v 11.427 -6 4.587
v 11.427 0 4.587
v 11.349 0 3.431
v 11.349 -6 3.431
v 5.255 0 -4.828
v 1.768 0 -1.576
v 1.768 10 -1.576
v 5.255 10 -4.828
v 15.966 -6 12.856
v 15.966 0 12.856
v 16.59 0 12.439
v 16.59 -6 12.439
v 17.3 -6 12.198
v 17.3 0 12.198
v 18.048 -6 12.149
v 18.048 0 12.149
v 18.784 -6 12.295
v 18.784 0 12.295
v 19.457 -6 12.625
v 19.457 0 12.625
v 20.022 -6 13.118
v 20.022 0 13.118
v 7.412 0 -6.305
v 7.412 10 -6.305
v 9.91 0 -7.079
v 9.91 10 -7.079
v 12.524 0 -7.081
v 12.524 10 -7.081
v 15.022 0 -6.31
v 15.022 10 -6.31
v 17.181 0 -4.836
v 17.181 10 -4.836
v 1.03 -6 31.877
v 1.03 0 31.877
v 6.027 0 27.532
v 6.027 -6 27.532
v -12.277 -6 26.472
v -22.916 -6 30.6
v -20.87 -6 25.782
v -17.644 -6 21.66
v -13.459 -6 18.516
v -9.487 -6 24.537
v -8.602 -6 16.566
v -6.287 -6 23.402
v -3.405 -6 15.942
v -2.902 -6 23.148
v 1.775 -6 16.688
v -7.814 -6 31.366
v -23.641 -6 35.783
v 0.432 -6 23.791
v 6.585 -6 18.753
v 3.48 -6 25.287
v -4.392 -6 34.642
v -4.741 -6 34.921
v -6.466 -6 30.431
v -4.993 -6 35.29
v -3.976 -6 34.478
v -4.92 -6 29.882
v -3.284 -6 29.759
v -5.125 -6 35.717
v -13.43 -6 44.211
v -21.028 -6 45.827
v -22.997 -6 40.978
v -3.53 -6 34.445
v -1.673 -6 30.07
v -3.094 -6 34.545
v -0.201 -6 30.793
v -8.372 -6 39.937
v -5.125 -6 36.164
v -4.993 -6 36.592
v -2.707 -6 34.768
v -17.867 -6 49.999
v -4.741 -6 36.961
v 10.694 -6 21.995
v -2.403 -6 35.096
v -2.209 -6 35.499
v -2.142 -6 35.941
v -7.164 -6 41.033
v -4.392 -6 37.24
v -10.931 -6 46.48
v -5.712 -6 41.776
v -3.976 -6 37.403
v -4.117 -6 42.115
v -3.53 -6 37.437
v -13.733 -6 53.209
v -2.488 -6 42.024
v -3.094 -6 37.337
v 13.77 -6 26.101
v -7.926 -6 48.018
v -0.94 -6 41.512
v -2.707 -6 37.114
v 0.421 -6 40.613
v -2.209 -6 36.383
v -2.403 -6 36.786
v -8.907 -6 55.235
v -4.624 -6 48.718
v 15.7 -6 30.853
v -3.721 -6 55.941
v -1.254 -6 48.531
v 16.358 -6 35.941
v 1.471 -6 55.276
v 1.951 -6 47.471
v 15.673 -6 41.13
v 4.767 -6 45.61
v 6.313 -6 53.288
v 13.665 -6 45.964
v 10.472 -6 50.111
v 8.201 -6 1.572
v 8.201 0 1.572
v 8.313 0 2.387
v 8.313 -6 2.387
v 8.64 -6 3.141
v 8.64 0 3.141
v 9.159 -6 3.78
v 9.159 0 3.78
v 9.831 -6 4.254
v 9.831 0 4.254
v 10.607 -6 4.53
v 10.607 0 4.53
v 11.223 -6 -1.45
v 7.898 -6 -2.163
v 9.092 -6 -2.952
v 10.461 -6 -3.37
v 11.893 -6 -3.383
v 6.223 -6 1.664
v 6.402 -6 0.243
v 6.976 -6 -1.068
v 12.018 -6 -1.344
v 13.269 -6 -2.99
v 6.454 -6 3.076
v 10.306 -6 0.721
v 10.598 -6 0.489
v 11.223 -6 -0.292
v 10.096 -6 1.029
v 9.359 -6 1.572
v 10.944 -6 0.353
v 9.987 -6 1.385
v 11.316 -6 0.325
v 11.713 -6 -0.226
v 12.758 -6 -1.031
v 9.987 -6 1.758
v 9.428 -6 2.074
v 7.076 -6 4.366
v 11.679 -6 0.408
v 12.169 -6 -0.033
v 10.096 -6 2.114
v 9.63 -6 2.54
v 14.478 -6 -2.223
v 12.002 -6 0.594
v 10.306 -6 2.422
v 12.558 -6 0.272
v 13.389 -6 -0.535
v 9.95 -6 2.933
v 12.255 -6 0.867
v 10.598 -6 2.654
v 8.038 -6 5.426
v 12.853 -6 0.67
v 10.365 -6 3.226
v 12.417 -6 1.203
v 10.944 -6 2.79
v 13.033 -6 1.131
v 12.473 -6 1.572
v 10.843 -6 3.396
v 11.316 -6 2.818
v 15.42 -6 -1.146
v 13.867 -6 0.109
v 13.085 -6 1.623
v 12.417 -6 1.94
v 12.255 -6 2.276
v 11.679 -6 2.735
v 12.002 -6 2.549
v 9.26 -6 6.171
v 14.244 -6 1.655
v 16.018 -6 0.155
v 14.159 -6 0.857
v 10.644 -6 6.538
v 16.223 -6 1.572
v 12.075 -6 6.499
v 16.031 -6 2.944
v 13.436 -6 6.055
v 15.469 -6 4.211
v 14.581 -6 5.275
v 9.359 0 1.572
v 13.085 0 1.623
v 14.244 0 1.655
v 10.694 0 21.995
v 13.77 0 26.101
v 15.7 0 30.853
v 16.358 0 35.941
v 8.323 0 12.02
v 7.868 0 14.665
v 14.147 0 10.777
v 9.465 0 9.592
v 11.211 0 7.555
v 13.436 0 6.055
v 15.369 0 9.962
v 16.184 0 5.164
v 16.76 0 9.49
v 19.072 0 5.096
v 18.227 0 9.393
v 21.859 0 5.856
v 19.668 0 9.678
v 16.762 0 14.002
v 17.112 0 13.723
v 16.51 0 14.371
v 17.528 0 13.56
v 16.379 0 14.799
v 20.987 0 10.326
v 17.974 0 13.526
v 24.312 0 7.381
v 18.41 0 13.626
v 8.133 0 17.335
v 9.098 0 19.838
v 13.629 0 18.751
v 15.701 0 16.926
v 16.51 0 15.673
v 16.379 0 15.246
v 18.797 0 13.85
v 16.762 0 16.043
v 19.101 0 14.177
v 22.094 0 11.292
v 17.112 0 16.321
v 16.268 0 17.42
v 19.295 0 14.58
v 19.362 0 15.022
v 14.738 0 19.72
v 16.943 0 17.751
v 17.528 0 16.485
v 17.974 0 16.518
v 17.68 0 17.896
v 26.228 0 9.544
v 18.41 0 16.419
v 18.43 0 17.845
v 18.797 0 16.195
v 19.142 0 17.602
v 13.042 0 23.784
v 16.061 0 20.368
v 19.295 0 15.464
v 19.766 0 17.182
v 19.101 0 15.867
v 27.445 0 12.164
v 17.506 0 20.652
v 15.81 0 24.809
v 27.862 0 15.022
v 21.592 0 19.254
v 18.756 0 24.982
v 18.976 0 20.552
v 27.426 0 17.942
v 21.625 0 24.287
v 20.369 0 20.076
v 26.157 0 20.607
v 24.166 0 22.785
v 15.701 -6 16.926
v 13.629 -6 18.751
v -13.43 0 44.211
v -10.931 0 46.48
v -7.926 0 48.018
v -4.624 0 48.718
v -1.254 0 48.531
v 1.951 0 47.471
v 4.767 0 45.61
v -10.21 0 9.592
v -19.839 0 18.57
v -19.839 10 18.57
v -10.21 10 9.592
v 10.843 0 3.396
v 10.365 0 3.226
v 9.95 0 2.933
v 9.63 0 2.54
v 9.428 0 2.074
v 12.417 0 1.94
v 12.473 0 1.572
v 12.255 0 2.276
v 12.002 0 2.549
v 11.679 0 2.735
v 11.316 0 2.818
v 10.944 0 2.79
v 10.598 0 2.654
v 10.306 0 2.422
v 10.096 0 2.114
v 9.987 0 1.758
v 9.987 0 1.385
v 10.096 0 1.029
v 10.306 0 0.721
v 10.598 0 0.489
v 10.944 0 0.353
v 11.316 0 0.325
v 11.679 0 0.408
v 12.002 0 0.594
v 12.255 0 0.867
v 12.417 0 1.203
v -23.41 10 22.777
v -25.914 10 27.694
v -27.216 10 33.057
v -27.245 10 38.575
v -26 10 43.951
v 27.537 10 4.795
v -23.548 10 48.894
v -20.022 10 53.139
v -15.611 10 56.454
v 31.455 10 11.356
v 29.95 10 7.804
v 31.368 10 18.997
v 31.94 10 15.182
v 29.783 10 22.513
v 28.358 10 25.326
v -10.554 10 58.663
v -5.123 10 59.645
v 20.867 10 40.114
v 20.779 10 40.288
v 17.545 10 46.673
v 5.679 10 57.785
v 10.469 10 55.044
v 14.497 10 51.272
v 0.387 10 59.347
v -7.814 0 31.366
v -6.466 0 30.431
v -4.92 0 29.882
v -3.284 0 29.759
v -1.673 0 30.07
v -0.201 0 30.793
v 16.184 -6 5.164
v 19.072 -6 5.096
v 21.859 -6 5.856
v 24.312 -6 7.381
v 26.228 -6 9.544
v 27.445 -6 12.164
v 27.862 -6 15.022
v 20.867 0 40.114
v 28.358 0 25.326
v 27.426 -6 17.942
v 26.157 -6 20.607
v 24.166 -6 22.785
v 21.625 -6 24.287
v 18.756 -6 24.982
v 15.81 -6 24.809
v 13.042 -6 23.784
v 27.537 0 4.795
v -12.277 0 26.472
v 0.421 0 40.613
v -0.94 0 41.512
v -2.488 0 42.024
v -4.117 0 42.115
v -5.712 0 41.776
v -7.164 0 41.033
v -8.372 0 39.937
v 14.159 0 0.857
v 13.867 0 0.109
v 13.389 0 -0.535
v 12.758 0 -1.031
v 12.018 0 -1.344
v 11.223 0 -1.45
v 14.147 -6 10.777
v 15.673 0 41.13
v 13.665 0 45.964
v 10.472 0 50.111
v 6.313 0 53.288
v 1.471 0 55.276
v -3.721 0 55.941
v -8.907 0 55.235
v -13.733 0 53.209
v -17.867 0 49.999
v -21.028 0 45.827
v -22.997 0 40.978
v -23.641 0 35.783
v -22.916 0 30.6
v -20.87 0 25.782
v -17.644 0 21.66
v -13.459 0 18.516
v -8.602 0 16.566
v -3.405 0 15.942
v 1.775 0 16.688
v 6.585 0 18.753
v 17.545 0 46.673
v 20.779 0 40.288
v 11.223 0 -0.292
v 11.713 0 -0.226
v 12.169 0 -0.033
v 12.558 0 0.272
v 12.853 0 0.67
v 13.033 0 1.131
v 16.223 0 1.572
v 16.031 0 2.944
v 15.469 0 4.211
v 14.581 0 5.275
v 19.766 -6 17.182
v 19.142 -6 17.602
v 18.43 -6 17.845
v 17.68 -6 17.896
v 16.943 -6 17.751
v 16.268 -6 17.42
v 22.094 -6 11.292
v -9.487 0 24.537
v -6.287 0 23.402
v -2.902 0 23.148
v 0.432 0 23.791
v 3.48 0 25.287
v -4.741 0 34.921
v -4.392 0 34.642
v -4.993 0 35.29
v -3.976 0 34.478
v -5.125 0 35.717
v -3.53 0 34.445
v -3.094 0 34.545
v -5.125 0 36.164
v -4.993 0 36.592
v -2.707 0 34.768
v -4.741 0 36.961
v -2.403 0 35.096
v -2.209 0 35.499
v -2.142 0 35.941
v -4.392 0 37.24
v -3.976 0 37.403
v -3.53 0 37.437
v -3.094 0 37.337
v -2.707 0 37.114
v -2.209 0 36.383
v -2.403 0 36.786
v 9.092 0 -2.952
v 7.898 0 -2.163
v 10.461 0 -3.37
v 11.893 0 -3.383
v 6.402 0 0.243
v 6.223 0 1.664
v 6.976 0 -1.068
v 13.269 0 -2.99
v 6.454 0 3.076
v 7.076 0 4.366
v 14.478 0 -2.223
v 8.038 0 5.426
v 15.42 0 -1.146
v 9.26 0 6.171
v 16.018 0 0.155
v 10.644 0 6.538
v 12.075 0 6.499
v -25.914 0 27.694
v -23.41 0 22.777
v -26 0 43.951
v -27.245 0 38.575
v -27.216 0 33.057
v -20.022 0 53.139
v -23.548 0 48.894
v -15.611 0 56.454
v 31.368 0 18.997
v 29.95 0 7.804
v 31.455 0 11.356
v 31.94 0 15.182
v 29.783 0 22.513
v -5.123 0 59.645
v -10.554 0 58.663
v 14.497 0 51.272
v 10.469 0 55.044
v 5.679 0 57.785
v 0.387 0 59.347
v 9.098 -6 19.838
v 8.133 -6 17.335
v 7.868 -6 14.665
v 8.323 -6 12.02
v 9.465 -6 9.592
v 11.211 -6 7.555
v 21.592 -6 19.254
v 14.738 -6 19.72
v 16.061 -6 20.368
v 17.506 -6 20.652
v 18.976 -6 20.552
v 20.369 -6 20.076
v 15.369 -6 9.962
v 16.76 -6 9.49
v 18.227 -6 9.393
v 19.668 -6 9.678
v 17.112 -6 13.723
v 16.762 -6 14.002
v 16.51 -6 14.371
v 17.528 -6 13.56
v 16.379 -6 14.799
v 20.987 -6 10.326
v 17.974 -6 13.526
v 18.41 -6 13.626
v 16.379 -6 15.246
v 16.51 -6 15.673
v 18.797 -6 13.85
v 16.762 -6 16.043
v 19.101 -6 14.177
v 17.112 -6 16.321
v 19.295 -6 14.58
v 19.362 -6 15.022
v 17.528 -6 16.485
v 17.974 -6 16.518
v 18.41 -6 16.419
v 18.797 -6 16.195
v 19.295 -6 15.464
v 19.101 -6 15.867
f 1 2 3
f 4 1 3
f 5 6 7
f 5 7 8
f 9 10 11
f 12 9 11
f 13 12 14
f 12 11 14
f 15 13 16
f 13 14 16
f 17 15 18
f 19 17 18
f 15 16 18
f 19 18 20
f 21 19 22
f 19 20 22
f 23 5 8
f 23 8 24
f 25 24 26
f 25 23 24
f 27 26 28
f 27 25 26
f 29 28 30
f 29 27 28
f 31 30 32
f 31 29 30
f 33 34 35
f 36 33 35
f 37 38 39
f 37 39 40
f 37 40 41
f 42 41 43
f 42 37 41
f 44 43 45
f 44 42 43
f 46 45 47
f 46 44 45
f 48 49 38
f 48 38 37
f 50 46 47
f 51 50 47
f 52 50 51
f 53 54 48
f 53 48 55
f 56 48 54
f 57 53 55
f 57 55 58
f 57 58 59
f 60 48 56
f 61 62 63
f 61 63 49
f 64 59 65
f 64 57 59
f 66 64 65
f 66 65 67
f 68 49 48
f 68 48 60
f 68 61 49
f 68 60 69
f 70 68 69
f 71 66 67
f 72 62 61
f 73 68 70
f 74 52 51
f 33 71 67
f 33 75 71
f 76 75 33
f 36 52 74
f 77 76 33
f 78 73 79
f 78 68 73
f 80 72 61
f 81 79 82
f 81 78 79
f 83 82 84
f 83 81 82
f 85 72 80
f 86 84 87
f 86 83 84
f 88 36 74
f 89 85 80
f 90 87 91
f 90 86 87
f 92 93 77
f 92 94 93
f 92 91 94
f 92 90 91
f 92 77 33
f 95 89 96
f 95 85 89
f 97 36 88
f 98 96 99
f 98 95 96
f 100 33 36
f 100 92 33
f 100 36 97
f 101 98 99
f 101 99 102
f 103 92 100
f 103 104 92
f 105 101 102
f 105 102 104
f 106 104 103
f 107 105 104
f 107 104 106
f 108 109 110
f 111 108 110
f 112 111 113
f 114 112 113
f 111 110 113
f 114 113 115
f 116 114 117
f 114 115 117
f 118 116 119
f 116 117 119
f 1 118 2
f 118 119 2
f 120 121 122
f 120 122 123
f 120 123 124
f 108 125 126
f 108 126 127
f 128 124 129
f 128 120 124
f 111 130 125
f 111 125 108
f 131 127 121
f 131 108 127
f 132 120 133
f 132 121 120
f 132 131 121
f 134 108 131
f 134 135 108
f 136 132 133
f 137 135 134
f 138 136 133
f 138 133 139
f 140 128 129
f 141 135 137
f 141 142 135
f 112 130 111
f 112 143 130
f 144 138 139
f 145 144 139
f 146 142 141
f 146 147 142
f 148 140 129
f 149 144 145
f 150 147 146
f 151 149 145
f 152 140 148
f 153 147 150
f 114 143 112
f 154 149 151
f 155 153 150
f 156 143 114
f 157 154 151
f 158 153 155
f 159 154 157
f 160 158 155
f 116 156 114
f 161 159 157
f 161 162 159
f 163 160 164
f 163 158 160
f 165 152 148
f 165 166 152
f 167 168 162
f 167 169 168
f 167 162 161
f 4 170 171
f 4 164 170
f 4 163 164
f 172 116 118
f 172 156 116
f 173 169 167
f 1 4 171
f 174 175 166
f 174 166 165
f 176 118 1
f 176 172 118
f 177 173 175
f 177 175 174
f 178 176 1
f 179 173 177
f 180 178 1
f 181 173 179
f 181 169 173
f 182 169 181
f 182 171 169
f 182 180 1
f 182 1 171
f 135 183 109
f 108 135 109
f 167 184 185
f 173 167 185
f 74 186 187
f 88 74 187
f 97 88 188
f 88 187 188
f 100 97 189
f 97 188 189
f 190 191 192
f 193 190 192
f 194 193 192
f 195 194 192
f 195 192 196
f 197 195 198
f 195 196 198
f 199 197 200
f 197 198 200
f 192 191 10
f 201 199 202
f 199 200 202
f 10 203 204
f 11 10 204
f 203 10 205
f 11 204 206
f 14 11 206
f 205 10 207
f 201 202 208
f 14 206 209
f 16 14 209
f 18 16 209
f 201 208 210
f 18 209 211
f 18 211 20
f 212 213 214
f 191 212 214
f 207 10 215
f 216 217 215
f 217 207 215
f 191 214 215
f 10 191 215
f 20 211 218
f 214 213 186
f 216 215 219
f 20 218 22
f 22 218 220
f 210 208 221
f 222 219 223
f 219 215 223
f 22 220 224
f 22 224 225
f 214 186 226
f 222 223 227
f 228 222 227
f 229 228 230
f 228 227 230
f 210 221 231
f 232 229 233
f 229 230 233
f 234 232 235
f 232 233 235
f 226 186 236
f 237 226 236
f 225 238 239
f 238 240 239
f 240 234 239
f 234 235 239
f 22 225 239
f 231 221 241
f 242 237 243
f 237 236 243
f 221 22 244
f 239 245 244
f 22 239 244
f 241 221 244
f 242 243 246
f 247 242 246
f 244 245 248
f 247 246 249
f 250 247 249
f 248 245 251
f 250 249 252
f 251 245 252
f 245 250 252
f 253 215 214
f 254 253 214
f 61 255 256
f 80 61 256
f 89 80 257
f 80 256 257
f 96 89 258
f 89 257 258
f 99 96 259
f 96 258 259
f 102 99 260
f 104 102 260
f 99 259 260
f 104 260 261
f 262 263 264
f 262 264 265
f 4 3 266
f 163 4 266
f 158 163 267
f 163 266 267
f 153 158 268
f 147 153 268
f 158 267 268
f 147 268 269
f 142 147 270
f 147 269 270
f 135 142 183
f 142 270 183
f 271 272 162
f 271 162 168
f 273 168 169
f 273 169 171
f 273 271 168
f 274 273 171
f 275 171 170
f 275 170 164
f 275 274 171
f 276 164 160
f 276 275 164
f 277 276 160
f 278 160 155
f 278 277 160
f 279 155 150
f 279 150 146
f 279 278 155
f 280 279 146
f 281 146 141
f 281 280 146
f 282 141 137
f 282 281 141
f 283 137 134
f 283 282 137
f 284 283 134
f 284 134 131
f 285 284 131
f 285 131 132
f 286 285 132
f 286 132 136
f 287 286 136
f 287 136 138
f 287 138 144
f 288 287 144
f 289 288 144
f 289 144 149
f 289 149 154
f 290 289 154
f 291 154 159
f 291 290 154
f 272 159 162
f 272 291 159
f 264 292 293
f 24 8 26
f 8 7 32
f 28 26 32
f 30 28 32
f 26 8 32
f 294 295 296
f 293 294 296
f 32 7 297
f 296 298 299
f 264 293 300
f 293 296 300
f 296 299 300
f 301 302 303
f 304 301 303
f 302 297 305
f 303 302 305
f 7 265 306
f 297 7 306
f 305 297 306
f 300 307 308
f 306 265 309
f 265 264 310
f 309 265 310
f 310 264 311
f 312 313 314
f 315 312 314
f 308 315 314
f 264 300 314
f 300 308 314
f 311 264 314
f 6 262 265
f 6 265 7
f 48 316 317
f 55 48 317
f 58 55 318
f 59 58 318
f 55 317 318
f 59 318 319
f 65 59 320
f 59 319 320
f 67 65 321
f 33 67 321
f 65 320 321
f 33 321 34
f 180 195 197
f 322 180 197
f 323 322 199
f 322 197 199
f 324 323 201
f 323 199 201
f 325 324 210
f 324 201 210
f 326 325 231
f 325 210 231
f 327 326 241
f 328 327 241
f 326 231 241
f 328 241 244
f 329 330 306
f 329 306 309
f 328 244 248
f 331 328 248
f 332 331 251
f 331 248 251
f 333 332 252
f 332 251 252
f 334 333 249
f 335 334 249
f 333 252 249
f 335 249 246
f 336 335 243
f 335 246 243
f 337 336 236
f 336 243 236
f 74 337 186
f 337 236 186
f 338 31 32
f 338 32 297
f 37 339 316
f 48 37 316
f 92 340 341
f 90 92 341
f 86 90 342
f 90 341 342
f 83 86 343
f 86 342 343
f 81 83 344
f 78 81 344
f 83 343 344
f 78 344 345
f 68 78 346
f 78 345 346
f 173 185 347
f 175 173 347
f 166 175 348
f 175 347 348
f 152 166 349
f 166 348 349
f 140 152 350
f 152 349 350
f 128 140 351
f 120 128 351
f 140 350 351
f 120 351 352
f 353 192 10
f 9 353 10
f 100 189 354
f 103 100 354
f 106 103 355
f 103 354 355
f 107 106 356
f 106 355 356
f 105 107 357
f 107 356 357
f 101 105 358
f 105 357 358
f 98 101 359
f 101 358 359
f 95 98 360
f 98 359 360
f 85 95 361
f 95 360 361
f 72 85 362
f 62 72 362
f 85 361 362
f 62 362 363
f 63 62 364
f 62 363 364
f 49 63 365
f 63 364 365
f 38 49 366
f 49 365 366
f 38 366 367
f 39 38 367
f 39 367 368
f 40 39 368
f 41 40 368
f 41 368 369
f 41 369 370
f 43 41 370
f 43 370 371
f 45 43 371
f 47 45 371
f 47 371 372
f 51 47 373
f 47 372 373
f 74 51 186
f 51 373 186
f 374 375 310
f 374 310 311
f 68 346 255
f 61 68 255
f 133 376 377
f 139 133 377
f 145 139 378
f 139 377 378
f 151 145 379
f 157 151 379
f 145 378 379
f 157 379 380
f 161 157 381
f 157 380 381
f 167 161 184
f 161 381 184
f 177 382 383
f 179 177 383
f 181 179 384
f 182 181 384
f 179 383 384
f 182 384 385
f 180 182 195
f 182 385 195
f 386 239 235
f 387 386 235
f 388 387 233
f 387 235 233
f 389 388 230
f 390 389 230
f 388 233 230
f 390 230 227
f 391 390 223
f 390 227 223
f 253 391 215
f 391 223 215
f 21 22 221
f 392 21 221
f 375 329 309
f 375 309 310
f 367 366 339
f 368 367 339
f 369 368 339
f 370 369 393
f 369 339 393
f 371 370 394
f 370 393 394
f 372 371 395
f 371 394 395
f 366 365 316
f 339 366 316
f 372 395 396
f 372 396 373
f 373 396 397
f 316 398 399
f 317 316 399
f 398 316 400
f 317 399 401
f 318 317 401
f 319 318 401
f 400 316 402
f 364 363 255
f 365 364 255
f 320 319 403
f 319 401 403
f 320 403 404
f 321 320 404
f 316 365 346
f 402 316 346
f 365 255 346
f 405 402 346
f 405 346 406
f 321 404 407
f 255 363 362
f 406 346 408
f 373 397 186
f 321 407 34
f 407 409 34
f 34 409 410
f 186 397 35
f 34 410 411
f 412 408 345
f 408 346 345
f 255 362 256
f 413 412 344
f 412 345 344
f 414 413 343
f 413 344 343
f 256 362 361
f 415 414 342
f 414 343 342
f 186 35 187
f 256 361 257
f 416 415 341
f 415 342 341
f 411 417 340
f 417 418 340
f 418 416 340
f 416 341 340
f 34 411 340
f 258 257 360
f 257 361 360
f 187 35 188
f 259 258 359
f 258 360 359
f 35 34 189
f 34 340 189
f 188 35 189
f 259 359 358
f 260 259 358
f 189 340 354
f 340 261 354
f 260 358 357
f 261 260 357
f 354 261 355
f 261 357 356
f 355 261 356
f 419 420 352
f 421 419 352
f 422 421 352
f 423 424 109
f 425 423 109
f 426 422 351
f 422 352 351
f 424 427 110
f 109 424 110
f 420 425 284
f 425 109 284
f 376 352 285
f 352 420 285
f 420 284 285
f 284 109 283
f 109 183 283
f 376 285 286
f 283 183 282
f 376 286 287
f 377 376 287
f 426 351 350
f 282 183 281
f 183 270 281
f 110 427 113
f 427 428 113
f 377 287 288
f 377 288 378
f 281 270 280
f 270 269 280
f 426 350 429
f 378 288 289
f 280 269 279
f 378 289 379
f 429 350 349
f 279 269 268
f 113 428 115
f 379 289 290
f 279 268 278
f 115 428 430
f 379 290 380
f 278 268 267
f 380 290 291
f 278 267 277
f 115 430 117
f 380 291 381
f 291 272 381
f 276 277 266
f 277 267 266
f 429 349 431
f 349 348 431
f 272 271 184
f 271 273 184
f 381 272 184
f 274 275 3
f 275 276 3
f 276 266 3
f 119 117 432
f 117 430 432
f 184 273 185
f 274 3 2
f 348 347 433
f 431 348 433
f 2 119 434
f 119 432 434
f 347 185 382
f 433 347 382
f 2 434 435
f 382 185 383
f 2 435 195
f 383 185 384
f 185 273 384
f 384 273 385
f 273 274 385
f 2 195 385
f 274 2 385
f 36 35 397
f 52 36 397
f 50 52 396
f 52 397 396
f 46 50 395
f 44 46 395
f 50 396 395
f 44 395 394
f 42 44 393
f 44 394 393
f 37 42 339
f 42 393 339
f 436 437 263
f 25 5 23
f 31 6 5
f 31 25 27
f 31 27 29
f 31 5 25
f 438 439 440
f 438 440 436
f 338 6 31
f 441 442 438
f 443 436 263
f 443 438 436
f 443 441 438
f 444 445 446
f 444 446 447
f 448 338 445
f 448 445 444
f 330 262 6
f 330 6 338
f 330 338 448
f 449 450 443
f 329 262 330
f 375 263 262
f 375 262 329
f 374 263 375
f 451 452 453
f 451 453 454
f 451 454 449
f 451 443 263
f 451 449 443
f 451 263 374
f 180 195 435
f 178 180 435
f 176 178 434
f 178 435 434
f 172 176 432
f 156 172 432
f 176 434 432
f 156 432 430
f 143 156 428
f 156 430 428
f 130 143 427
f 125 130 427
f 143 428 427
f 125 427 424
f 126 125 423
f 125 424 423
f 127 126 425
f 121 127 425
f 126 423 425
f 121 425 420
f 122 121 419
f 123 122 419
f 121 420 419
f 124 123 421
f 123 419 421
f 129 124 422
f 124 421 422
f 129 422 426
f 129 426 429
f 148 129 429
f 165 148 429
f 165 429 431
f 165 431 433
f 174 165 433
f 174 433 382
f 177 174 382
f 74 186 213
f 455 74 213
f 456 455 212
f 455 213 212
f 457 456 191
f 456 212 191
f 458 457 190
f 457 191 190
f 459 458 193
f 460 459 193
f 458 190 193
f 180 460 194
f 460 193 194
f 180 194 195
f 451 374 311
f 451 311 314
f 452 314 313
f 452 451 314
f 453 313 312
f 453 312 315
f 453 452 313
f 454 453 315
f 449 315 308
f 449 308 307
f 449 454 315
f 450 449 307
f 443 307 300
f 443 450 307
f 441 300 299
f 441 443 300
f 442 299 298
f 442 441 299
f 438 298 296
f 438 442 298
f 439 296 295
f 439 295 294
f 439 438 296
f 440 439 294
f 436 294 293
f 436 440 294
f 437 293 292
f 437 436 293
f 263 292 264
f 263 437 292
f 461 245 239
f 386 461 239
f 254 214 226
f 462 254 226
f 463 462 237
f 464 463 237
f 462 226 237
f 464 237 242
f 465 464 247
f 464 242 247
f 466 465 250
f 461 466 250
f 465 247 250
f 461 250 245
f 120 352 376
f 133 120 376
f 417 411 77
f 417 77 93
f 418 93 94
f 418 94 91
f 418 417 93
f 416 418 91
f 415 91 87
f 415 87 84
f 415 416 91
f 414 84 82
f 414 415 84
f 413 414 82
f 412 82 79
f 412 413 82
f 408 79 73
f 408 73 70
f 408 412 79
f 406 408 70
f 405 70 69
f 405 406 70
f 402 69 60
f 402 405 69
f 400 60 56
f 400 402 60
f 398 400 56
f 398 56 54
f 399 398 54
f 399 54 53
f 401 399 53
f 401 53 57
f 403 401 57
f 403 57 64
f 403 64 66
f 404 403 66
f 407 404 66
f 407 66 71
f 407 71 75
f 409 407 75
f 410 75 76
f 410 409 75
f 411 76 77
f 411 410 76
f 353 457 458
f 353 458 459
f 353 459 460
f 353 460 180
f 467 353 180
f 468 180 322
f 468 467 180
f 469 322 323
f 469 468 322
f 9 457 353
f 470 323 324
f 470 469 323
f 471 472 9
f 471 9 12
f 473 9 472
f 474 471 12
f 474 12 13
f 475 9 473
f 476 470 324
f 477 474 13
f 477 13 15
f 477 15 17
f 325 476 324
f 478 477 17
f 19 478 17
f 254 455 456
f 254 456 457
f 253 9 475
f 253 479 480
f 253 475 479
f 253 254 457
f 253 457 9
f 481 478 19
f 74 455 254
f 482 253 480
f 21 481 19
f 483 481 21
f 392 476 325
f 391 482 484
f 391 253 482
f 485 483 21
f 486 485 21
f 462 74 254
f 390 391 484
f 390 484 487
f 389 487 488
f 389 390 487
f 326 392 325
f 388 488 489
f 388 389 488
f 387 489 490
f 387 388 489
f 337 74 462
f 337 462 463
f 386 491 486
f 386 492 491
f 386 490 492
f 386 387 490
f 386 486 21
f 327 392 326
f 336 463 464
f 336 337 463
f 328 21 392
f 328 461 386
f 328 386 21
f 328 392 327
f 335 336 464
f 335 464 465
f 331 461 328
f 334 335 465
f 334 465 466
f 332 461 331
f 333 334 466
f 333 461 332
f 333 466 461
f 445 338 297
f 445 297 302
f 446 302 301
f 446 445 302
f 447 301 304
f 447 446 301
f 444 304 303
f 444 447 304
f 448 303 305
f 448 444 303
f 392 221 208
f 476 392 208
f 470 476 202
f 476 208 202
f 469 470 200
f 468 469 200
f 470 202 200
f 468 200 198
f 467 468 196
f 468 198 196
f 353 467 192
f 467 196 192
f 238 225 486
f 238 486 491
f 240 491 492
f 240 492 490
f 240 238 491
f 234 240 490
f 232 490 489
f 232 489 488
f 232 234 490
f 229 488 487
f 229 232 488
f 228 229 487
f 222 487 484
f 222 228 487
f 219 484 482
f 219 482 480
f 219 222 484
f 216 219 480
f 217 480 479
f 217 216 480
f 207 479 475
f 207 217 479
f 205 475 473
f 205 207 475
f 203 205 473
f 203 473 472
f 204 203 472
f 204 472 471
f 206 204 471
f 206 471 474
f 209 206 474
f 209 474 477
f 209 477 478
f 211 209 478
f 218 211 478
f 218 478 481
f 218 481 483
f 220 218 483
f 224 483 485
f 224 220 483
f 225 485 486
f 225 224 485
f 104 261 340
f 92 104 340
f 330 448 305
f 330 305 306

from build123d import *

# Parameters (mm, degrees)
F0_R     = 1.5
F1_DEPTH = 6
F0_R_2   = 1.25
F2_DEPTH = 10


with BuildPart() as f1:
    # F0 (on Front) → F1 (new body)
    with BuildSketch(Plane.XZ):
        with BuildLine():
            ThreePointArc((16.3580985837, 35.9408579887), (-22.1718407809, 43.466902577), (10.6939638692, 21.9951430011))
            ThreePointArc((10.6939638692, 21.9951430011), (14.8880379483, 28.4148134004), (16.3580985837, 35.9408579887))
        make_face()
        with BuildLine():
            ThreePointArc((6.0273938907, 27.5315641069), (-2.9016900494, 23.1477511551), (-12.2767915919, 26.4724807793))
            Line((-12.2767915919, 26.4724807793), (-7.8142975918, 31.3657192142))
            ThreePointArc((-7.8142975918, 31.3657192142), (-3.2842298057, 29.7592032207), (1.0303213842, 31.8774703929))
            Line((1.0303213842, 31.8774703929), (6.0273938907, 27.5315641069))
        make_face(mode=Mode.SUBTRACT)
        with Locations((-3.6419014163, 35.9408579887)):
            Circle(F0_R, mode=Mode.SUBTRACT)
        with BuildLine():
            Line((-8.3717686573, 39.9369986937), (-13.4304934995, 44.2109825557))
            ThreePointArc((-13.4304934995, 44.2109825557), (-4.624263657, 48.7176517866), (4.7673924656, 45.6101532957))
            Line((4.7673924656, 45.6101532957), (0.4214861795, 40.6130807892))
            ThreePointArc((0.4214861795, 40.6130807892), (-4.1165808127, 42.1146302652), (-8.3717686573, 39.9369986937))
        make_face(mode=Mode.SUBTRACT)
    extrude(amount=F1_DEPTH)


with BuildPart() as f1b:
    # F0 (on Front) → F1, piece 2 (new body)
    with BuildSketch(Plane.XZ):
        with BuildLine():
            ThreePointArc((13.435691954, 6.055194912), (23.1410041166, 6.529287036), (27.8618964924, 15.0222854872))
            ThreePointArc((27.8618964924, 15.0222854872), (21.6249187996, 24.2872551642), (10.6939638692, 21.9951430011))
            ThreePointArc((10.6939638692, 21.9951430011), (8.0066192055, 13.3271425439), (13.435691954, 6.055194912))
        make_face()
        with BuildLine():
            ThreePointArc((22.093804723, 11.2920162674), (18.2266093558, 9.392814797), (14.1466855378, 10.7771514154))
            Line((14.1466855378, 10.7771514154), (15.9656262669, 12.8555387151))
            ThreePointArc((15.9656262669, 12.8555387151), (18.0480485447, 12.1489634106), (20.0218927007, 13.1183294155))
            Line((20.0218927007, 13.1183294155), (22.093804723, 11.2920162674))
        make_face(mode=Mode.SUBTRACT)
        with Locations((17.8618964924, 15.0222854872)):
            Circle(F0_R, mode=Mode.SUBTRACT)
        with BuildLine():
            Line((21.5921657123, 19.2541937178), (19.7658525641, 17.1822816954))
            ThreePointArc((19.7658525641, 17.1822816954), (17.6803835082, 17.8959043518), (15.7012838619, 16.9255420131))
            Line((15.7012838619, 16.9255420131), (13.6287805547, 18.7511841427))
            ThreePointArc((13.6287805547, 18.7511841427), (17.5062725849, 20.6523376505), (21.5921657123, 19.2541937178))
        make_face(mode=Mode.SUBTRACT)
    extrude(amount=F1_DEPTH)


with BuildPart() as f1c:
    # F0 (on Front) → F1, piece 3 (new body)
    with BuildSketch(Plane.XZ):
        with BuildLine():
            ThreePointArc((16.2225897462, 1.5716495941), (15.4690889537, 4.2112034353), (13.435691954, 6.055194912))
            ThreePointArc((13.435691954, 6.055194912), (6.9760905387, -1.0679042471), (16.2225897462, 1.5716495941))
        make_face()
        with BuildLine():
            ThreePointArc((14.243500535, 1.6553022013), (13.3888888582, -0.5354925249), (11.2225897462, -1.4504191928))
            Line((11.2225897462, -1.4504191928), (11.2225897462, -0.2917109707))
            ThreePointArc((11.2225897462, -0.2917109707), (12.5582960526, 0.2724185686), (13.0852363074, 1.6232284893))
            Line((13.0852363074, 1.6232284893), (14.243500535, 1.6553022013))
        make_face(mode=Mode.SUBTRACT)
        with Locations((11.2225897462, 1.5716495941)):
            Circle(F0_R_2, mode=Mode.SUBTRACT)
        with BuildLine():
            Line((11.4274693125, 4.5867655315), (11.3489152971, 3.4307231402))
            ThreePointArc((11.3489152971, 3.4307231402), (9.950441456, 2.9331749601), (9.3592291814, 1.5716495941))
            Line((9.3592291814, 1.5716495941), (8.2005209593, 1.5716495941))
            ThreePointArc((8.2005209593, 1.5716495941), (9.1593714337, 3.7798230356), (11.4274693125, 4.5867655315))
        make_face(mode=Mode.SUBTRACT)
    extrude(amount=F1_DEPTH)


with BuildPart() as f2:
    # F0 (on Front) → F2 (new body)
    with BuildSketch(Plane.XZ):
        with BuildLine():
            Line((20.7791233288, 40.2880805518), (17.5451188249, 46.6727111977))
            ThreePointArc((17.5451188249, 46.6727111977), (-17.9128327561, 54.9251414541), (-19.8385976064, 18.5704943619))
            Line((-19.8385976064, 18.5704943619), (-10.2095571952, 9.5920615846))
            Line((-10.2095571952, 9.5920615846), (-7.1513450091, 12.8718821787))
            Line((-7.1513450091, 12.8718821787), (3.2381131314, 12.8718821787))
            Line((3.2381131314, 12.8718821787), (3.2381131314, 0))
            Line((3.2381131314, 0), (1.7682181228, -1.5764085769))
            Line((1.7682181228, -1.5764085769), (5.2553858867, -4.8279580579))
            ThreePointArc((5.2553858867, -4.8279580579), (11.2167692255, -7.17834847), (17.1812742584, -4.8358911888))
            Line((17.1812742584, -4.8358911888), (27.5374240602, 4.7947973267))
            ThreePointArc((27.5374240602, 4.7947973267), (31.8291700474, 13.2523653679), (29.7826724027, 22.5131098402))
            Line((29.7826724027, 22.5131098402), (28.3577955273, 25.3261277423))
            Line((28.3577955273, 25.3261277423), (20.8670881614, 28.5439335322))
            Line((20.8670881614, 28.5439335322), (20.8670881614, 40.1144187757))
            Line((20.8670881614, 40.1144187757), (20.7791233288, 40.2880805518))
        make_face()
        with BuildLine():
            ThreePointArc((16.2225897462, 1.5716495941), (6.9760905387, -1.0679042471), (13.435691954, 6.055194912))
            ThreePointArc((13.435691954, 6.055194912), (15.4690889537, 4.2112034353), (16.2225897462, 1.5716495941))
        make_face(mode=Mode.SUBTRACT)
        with BuildLine():
            ThreePointArc((10.6939638692, 21.9951430011), (21.6249187996, 24.2872551642), (27.8618964924, 15.0222854872))
            ThreePointArc((27.8618964924, 15.0222854872), (23.1410041166, 6.529287036), (13.435691954, 6.055194912))
            ThreePointArc((13.435691954, 6.055194912), (8.0066192055, 13.3271425439), (10.6939638692, 21.9951430011))
        make_face(mode=Mode.SUBTRACT)
        with BuildLine():
            ThreePointArc((16.3580985837, 35.9408579887), (14.8880379483, 28.4148134004), (10.6939638692, 21.9951430011))
            ThreePointArc((10.6939638692, 21.9951430011), (-22.1718407809, 43.466902577), (16.3580985837, 35.9408579887))
        make_face(mode=Mode.SUBTRACT)
        with BuildLine():
            ThreePointArc((16.3580985837, 35.9408579887), (-22.1718407809, 43.466902577), (10.6939638692, 21.9951430011))
            ThreePointArc((10.6939638692, 21.9951430011), (14.8880379483, 28.4148134004), (16.3580985837, 35.9408579887))
        make_face()
        with BuildLine():
            ThreePointArc((6.0273938907, 27.5315641069), (-2.9016900494, 23.1477511551), (-12.2767915919, 26.4724807793))
            Line((-12.2767915919, 26.4724807793), (-7.8142975918, 31.3657192142))
            ThreePointArc((-7.8142975918, 31.3657192142), (-3.2842298057, 29.7592032207), (1.0303213842, 31.8774703929))
            Line((1.0303213842, 31.8774703929), (6.0273938907, 27.5315641069))
        make_face(mode=Mode.SUBTRACT)
        with Locations((-3.6419014163, 35.9408579887)):
            Circle(F0_R, mode=Mode.SUBTRACT)
        with BuildLine():
            Line((-8.3717686573, 39.9369986937), (-13.4304934995, 44.2109825557))
            ThreePointArc((-13.4304934995, 44.2109825557), (-4.624263657, 48.7176517866), (4.7673924656, 45.6101532957))
            Line((4.7673924656, 45.6101532957), (0.4214861795, 40.6130807892))
            ThreePointArc((0.4214861795, 40.6130807892), (-4.1165808127, 42.1146302652), (-8.3717686573, 39.9369986937))
        make_face(mode=Mode.SUBTRACT)
        with BuildLine():
            ThreePointArc((13.435691954, 6.055194912), (23.1410041166, 6.529287036), (27.8618964924, 15.0222854872))
            ThreePointArc((27.8618964924, 15.0222854872), (21.6249187996, 24.2872551642), (10.6939638692, 21.9951430011))
            ThreePointArc((10.6939638692, 21.9951430011), (8.0066192055, 13.3271425439), (13.435691954, 6.055194912))
        make_face()
        with BuildLine():
            ThreePointArc((22.093804723, 11.2920162674), (18.2266093558, 9.392814797), (14.1466855378, 10.7771514154))
            Line((14.1466855378, 10.7771514154), (15.9656262669, 12.8555387151))
            ThreePointArc((15.9656262669, 12.8555387151), (18.0480485447, 12.1489634106), (20.0218927007, 13.1183294155))
            Line((20.0218927007, 13.1183294155), (22.093804723, 11.2920162674))
        make_face(mode=Mode.SUBTRACT)
        with Locations((17.8618964924, 15.0222854872)):
            Circle(F0_R, mode=Mode.SUBTRACT)
        with BuildLine():
            Line((21.5921657123, 19.2541937178), (19.7658525641, 17.1822816954))
            ThreePointArc((19.7658525641, 17.1822816954), (17.6803835082, 17.8959043518), (15.7012838619, 16.9255420131))
            Line((15.7012838619, 16.9255420131), (13.6287805547, 18.7511841427))
            ThreePointArc((13.6287805547, 18.7511841427), (17.5062725849, 20.6523376505), (21.5921657123, 19.2541937178))
        make_face(mode=Mode.SUBTRACT)
        Polygon((-7.1513450091, 12.8718821787), (-10.2095571952, 9.5920615846), (1.7682181228, -1.5764085769), (3.2381131314, 0), (3.2381131314, 12.8718821787), align=None)
        with BuildLine():
            Line((-7.8142975918, 31.3657192142), (-12.2767915919, 26.4724807793))
            ThreePointArc((-12.2767915919, 26.4724807793), (-2.9016900494, 23.1477511551), (6.0273938907, 27.5315641069))
            Line((6.0273938907, 27.5315641069), (1.0303213842, 31.8774703929))
            ThreePointArc((1.0303213842, 31.8774703929), (-3.2842298057, 29.7592032207), (-7.8142975918, 31.3657192142))
        make_face()
        with BuildLine():
            ThreePointArc((4.7673924656, 45.6101532957), (-4.624263657, 48.7176517866), (-13.4304934995, 44.2109825557))
            Line((-13.4304934995, 44.2109825557), (-8.3717686573, 39.9369986937))
            ThreePointArc((-8.3717686573, 39.9369986937), (-4.1165808127, 42.1146302652), (0.4214861795, 40.6130807892))
            Line((0.4214861795, 40.6130807892), (4.7673924656, 45.6101532957))
        make_face()
        with BuildLine():
            ThreePointArc((16.2225897462, 1.5716495941), (15.4690889537, 4.2112034353), (13.435691954, 6.055194912))
            ThreePointArc((13.435691954, 6.055194912), (6.9760905387, -1.0679042471), (16.2225897462, 1.5716495941))
        make_face()
        with BuildLine():
            ThreePointArc((14.243500535, 1.6553022013), (13.3888888582, -0.5354925249), (11.2225897462, -1.4504191928))
            Line((11.2225897462, -1.4504191928), (11.2225897462, -0.2917109707))
            ThreePointArc((11.2225897462, -0.2917109707), (12.5582960526, 0.2724185686), (13.0852363074, 1.6232284893))
            Line((13.0852363074, 1.6232284893), (14.243500535, 1.6553022013))
        make_face(mode=Mode.SUBTRACT)
        with Locations((11.2225897462, 1.5716495941)):
            Circle(F0_R_2, mode=Mode.SUBTRACT)
        with BuildLine():
            Line((11.4274693125, 4.5867655315), (11.3489152971, 3.4307231402))
            ThreePointArc((11.3489152971, 3.4307231402), (9.950441456, 2.9331749601), (9.3592291814, 1.5716495941))
            Line((9.3592291814, 1.5716495941), (8.2005209593, 1.5716495941))
            ThreePointArc((8.2005209593, 1.5716495941), (9.1593714337, 3.7798230356), (11.4274693125, 4.5867655315))
        make_face(mode=Mode.SUBTRACT)
        Polygon((28.3577955273, 25.3261277423), (20.8670881614, 40.1144187757), (20.8670881614, 28.5439335322), align=None)
        with BuildLine():
            ThreePointArc((15.7012838619, 16.9255420131), (17.6803835082, 17.8959043518), (19.7658525641, 17.1822816954))
            Line((19.7658525641, 17.1822816954), (21.5921657123, 19.2541937178))
            ThreePointArc((21.5921657123, 19.2541937178), (17.5062725849, 20.6523376505), (13.6287805547, 18.7511841427))
            Line((13.6287805547, 18.7511841427), (15.7012838619, 16.9255420131))
        make_face()
        with BuildLine():
            Line((15.9656262669, 12.8555387151), (14.1466855378, 10.7771514154))
            ThreePointArc((14.1466855378, 10.7771514154), (18.2266093558, 9.392814797), (22.093804723, 11.2920162674))
            Line((22.093804723, 11.2920162674), (20.0218927007, 13.1183294155))
            ThreePointArc((20.0218927007, 13.1183294155), (18.0480485447, 12.1489634106), (15.9656262669, 12.8555387151))
        make_face()
        with Locations((17.8618964924, 15.0222854872)):
            Circle(F0_R)
        with Locations((-3.6419014163, 35.9408579887)):
            Circle(F0_R)
        with Locations((11.2225897462, 1.5716495941)):
            Circle(F0_R_2)
        with BuildLine():
            ThreePointArc((9.3592291814, 1.5716495941), (9.950441456, 2.9331749601), (11.3489152971, 3.4307231402))
            Line((11.3489152971, 3.4307231402), (11.4274693125, 4.5867655315))
            ThreePointArc((11.4274693125, 4.5867655315), (9.1593714337, 3.7798230356), (8.2005209593, 1.5716495941))
            Line((8.2005209593, 1.5716495941), (9.3592291814, 1.5716495941))
        make_face()
        with BuildLine():
            Line((11.2225897462, -0.2917109707), (11.2225897462, -1.4504191928))
            ThreePointArc((11.2225897462, -1.4504191928), (13.3888888582, -0.5354925249), (14.243500535, 1.6553022013))
            Line((14.243500535, 1.6553022013), (13.0852363074, 1.6232284893))
            ThreePointArc((13.0852363074, 1.6232284893), (12.5582960526, 0.2724185686), (11.2225897462, -0.2917109707))
        make_face()
    extrude(amount=-F2_DEPTH)


solid = Compound([f1.part, f1b.part, f1c.part, f2.part])
